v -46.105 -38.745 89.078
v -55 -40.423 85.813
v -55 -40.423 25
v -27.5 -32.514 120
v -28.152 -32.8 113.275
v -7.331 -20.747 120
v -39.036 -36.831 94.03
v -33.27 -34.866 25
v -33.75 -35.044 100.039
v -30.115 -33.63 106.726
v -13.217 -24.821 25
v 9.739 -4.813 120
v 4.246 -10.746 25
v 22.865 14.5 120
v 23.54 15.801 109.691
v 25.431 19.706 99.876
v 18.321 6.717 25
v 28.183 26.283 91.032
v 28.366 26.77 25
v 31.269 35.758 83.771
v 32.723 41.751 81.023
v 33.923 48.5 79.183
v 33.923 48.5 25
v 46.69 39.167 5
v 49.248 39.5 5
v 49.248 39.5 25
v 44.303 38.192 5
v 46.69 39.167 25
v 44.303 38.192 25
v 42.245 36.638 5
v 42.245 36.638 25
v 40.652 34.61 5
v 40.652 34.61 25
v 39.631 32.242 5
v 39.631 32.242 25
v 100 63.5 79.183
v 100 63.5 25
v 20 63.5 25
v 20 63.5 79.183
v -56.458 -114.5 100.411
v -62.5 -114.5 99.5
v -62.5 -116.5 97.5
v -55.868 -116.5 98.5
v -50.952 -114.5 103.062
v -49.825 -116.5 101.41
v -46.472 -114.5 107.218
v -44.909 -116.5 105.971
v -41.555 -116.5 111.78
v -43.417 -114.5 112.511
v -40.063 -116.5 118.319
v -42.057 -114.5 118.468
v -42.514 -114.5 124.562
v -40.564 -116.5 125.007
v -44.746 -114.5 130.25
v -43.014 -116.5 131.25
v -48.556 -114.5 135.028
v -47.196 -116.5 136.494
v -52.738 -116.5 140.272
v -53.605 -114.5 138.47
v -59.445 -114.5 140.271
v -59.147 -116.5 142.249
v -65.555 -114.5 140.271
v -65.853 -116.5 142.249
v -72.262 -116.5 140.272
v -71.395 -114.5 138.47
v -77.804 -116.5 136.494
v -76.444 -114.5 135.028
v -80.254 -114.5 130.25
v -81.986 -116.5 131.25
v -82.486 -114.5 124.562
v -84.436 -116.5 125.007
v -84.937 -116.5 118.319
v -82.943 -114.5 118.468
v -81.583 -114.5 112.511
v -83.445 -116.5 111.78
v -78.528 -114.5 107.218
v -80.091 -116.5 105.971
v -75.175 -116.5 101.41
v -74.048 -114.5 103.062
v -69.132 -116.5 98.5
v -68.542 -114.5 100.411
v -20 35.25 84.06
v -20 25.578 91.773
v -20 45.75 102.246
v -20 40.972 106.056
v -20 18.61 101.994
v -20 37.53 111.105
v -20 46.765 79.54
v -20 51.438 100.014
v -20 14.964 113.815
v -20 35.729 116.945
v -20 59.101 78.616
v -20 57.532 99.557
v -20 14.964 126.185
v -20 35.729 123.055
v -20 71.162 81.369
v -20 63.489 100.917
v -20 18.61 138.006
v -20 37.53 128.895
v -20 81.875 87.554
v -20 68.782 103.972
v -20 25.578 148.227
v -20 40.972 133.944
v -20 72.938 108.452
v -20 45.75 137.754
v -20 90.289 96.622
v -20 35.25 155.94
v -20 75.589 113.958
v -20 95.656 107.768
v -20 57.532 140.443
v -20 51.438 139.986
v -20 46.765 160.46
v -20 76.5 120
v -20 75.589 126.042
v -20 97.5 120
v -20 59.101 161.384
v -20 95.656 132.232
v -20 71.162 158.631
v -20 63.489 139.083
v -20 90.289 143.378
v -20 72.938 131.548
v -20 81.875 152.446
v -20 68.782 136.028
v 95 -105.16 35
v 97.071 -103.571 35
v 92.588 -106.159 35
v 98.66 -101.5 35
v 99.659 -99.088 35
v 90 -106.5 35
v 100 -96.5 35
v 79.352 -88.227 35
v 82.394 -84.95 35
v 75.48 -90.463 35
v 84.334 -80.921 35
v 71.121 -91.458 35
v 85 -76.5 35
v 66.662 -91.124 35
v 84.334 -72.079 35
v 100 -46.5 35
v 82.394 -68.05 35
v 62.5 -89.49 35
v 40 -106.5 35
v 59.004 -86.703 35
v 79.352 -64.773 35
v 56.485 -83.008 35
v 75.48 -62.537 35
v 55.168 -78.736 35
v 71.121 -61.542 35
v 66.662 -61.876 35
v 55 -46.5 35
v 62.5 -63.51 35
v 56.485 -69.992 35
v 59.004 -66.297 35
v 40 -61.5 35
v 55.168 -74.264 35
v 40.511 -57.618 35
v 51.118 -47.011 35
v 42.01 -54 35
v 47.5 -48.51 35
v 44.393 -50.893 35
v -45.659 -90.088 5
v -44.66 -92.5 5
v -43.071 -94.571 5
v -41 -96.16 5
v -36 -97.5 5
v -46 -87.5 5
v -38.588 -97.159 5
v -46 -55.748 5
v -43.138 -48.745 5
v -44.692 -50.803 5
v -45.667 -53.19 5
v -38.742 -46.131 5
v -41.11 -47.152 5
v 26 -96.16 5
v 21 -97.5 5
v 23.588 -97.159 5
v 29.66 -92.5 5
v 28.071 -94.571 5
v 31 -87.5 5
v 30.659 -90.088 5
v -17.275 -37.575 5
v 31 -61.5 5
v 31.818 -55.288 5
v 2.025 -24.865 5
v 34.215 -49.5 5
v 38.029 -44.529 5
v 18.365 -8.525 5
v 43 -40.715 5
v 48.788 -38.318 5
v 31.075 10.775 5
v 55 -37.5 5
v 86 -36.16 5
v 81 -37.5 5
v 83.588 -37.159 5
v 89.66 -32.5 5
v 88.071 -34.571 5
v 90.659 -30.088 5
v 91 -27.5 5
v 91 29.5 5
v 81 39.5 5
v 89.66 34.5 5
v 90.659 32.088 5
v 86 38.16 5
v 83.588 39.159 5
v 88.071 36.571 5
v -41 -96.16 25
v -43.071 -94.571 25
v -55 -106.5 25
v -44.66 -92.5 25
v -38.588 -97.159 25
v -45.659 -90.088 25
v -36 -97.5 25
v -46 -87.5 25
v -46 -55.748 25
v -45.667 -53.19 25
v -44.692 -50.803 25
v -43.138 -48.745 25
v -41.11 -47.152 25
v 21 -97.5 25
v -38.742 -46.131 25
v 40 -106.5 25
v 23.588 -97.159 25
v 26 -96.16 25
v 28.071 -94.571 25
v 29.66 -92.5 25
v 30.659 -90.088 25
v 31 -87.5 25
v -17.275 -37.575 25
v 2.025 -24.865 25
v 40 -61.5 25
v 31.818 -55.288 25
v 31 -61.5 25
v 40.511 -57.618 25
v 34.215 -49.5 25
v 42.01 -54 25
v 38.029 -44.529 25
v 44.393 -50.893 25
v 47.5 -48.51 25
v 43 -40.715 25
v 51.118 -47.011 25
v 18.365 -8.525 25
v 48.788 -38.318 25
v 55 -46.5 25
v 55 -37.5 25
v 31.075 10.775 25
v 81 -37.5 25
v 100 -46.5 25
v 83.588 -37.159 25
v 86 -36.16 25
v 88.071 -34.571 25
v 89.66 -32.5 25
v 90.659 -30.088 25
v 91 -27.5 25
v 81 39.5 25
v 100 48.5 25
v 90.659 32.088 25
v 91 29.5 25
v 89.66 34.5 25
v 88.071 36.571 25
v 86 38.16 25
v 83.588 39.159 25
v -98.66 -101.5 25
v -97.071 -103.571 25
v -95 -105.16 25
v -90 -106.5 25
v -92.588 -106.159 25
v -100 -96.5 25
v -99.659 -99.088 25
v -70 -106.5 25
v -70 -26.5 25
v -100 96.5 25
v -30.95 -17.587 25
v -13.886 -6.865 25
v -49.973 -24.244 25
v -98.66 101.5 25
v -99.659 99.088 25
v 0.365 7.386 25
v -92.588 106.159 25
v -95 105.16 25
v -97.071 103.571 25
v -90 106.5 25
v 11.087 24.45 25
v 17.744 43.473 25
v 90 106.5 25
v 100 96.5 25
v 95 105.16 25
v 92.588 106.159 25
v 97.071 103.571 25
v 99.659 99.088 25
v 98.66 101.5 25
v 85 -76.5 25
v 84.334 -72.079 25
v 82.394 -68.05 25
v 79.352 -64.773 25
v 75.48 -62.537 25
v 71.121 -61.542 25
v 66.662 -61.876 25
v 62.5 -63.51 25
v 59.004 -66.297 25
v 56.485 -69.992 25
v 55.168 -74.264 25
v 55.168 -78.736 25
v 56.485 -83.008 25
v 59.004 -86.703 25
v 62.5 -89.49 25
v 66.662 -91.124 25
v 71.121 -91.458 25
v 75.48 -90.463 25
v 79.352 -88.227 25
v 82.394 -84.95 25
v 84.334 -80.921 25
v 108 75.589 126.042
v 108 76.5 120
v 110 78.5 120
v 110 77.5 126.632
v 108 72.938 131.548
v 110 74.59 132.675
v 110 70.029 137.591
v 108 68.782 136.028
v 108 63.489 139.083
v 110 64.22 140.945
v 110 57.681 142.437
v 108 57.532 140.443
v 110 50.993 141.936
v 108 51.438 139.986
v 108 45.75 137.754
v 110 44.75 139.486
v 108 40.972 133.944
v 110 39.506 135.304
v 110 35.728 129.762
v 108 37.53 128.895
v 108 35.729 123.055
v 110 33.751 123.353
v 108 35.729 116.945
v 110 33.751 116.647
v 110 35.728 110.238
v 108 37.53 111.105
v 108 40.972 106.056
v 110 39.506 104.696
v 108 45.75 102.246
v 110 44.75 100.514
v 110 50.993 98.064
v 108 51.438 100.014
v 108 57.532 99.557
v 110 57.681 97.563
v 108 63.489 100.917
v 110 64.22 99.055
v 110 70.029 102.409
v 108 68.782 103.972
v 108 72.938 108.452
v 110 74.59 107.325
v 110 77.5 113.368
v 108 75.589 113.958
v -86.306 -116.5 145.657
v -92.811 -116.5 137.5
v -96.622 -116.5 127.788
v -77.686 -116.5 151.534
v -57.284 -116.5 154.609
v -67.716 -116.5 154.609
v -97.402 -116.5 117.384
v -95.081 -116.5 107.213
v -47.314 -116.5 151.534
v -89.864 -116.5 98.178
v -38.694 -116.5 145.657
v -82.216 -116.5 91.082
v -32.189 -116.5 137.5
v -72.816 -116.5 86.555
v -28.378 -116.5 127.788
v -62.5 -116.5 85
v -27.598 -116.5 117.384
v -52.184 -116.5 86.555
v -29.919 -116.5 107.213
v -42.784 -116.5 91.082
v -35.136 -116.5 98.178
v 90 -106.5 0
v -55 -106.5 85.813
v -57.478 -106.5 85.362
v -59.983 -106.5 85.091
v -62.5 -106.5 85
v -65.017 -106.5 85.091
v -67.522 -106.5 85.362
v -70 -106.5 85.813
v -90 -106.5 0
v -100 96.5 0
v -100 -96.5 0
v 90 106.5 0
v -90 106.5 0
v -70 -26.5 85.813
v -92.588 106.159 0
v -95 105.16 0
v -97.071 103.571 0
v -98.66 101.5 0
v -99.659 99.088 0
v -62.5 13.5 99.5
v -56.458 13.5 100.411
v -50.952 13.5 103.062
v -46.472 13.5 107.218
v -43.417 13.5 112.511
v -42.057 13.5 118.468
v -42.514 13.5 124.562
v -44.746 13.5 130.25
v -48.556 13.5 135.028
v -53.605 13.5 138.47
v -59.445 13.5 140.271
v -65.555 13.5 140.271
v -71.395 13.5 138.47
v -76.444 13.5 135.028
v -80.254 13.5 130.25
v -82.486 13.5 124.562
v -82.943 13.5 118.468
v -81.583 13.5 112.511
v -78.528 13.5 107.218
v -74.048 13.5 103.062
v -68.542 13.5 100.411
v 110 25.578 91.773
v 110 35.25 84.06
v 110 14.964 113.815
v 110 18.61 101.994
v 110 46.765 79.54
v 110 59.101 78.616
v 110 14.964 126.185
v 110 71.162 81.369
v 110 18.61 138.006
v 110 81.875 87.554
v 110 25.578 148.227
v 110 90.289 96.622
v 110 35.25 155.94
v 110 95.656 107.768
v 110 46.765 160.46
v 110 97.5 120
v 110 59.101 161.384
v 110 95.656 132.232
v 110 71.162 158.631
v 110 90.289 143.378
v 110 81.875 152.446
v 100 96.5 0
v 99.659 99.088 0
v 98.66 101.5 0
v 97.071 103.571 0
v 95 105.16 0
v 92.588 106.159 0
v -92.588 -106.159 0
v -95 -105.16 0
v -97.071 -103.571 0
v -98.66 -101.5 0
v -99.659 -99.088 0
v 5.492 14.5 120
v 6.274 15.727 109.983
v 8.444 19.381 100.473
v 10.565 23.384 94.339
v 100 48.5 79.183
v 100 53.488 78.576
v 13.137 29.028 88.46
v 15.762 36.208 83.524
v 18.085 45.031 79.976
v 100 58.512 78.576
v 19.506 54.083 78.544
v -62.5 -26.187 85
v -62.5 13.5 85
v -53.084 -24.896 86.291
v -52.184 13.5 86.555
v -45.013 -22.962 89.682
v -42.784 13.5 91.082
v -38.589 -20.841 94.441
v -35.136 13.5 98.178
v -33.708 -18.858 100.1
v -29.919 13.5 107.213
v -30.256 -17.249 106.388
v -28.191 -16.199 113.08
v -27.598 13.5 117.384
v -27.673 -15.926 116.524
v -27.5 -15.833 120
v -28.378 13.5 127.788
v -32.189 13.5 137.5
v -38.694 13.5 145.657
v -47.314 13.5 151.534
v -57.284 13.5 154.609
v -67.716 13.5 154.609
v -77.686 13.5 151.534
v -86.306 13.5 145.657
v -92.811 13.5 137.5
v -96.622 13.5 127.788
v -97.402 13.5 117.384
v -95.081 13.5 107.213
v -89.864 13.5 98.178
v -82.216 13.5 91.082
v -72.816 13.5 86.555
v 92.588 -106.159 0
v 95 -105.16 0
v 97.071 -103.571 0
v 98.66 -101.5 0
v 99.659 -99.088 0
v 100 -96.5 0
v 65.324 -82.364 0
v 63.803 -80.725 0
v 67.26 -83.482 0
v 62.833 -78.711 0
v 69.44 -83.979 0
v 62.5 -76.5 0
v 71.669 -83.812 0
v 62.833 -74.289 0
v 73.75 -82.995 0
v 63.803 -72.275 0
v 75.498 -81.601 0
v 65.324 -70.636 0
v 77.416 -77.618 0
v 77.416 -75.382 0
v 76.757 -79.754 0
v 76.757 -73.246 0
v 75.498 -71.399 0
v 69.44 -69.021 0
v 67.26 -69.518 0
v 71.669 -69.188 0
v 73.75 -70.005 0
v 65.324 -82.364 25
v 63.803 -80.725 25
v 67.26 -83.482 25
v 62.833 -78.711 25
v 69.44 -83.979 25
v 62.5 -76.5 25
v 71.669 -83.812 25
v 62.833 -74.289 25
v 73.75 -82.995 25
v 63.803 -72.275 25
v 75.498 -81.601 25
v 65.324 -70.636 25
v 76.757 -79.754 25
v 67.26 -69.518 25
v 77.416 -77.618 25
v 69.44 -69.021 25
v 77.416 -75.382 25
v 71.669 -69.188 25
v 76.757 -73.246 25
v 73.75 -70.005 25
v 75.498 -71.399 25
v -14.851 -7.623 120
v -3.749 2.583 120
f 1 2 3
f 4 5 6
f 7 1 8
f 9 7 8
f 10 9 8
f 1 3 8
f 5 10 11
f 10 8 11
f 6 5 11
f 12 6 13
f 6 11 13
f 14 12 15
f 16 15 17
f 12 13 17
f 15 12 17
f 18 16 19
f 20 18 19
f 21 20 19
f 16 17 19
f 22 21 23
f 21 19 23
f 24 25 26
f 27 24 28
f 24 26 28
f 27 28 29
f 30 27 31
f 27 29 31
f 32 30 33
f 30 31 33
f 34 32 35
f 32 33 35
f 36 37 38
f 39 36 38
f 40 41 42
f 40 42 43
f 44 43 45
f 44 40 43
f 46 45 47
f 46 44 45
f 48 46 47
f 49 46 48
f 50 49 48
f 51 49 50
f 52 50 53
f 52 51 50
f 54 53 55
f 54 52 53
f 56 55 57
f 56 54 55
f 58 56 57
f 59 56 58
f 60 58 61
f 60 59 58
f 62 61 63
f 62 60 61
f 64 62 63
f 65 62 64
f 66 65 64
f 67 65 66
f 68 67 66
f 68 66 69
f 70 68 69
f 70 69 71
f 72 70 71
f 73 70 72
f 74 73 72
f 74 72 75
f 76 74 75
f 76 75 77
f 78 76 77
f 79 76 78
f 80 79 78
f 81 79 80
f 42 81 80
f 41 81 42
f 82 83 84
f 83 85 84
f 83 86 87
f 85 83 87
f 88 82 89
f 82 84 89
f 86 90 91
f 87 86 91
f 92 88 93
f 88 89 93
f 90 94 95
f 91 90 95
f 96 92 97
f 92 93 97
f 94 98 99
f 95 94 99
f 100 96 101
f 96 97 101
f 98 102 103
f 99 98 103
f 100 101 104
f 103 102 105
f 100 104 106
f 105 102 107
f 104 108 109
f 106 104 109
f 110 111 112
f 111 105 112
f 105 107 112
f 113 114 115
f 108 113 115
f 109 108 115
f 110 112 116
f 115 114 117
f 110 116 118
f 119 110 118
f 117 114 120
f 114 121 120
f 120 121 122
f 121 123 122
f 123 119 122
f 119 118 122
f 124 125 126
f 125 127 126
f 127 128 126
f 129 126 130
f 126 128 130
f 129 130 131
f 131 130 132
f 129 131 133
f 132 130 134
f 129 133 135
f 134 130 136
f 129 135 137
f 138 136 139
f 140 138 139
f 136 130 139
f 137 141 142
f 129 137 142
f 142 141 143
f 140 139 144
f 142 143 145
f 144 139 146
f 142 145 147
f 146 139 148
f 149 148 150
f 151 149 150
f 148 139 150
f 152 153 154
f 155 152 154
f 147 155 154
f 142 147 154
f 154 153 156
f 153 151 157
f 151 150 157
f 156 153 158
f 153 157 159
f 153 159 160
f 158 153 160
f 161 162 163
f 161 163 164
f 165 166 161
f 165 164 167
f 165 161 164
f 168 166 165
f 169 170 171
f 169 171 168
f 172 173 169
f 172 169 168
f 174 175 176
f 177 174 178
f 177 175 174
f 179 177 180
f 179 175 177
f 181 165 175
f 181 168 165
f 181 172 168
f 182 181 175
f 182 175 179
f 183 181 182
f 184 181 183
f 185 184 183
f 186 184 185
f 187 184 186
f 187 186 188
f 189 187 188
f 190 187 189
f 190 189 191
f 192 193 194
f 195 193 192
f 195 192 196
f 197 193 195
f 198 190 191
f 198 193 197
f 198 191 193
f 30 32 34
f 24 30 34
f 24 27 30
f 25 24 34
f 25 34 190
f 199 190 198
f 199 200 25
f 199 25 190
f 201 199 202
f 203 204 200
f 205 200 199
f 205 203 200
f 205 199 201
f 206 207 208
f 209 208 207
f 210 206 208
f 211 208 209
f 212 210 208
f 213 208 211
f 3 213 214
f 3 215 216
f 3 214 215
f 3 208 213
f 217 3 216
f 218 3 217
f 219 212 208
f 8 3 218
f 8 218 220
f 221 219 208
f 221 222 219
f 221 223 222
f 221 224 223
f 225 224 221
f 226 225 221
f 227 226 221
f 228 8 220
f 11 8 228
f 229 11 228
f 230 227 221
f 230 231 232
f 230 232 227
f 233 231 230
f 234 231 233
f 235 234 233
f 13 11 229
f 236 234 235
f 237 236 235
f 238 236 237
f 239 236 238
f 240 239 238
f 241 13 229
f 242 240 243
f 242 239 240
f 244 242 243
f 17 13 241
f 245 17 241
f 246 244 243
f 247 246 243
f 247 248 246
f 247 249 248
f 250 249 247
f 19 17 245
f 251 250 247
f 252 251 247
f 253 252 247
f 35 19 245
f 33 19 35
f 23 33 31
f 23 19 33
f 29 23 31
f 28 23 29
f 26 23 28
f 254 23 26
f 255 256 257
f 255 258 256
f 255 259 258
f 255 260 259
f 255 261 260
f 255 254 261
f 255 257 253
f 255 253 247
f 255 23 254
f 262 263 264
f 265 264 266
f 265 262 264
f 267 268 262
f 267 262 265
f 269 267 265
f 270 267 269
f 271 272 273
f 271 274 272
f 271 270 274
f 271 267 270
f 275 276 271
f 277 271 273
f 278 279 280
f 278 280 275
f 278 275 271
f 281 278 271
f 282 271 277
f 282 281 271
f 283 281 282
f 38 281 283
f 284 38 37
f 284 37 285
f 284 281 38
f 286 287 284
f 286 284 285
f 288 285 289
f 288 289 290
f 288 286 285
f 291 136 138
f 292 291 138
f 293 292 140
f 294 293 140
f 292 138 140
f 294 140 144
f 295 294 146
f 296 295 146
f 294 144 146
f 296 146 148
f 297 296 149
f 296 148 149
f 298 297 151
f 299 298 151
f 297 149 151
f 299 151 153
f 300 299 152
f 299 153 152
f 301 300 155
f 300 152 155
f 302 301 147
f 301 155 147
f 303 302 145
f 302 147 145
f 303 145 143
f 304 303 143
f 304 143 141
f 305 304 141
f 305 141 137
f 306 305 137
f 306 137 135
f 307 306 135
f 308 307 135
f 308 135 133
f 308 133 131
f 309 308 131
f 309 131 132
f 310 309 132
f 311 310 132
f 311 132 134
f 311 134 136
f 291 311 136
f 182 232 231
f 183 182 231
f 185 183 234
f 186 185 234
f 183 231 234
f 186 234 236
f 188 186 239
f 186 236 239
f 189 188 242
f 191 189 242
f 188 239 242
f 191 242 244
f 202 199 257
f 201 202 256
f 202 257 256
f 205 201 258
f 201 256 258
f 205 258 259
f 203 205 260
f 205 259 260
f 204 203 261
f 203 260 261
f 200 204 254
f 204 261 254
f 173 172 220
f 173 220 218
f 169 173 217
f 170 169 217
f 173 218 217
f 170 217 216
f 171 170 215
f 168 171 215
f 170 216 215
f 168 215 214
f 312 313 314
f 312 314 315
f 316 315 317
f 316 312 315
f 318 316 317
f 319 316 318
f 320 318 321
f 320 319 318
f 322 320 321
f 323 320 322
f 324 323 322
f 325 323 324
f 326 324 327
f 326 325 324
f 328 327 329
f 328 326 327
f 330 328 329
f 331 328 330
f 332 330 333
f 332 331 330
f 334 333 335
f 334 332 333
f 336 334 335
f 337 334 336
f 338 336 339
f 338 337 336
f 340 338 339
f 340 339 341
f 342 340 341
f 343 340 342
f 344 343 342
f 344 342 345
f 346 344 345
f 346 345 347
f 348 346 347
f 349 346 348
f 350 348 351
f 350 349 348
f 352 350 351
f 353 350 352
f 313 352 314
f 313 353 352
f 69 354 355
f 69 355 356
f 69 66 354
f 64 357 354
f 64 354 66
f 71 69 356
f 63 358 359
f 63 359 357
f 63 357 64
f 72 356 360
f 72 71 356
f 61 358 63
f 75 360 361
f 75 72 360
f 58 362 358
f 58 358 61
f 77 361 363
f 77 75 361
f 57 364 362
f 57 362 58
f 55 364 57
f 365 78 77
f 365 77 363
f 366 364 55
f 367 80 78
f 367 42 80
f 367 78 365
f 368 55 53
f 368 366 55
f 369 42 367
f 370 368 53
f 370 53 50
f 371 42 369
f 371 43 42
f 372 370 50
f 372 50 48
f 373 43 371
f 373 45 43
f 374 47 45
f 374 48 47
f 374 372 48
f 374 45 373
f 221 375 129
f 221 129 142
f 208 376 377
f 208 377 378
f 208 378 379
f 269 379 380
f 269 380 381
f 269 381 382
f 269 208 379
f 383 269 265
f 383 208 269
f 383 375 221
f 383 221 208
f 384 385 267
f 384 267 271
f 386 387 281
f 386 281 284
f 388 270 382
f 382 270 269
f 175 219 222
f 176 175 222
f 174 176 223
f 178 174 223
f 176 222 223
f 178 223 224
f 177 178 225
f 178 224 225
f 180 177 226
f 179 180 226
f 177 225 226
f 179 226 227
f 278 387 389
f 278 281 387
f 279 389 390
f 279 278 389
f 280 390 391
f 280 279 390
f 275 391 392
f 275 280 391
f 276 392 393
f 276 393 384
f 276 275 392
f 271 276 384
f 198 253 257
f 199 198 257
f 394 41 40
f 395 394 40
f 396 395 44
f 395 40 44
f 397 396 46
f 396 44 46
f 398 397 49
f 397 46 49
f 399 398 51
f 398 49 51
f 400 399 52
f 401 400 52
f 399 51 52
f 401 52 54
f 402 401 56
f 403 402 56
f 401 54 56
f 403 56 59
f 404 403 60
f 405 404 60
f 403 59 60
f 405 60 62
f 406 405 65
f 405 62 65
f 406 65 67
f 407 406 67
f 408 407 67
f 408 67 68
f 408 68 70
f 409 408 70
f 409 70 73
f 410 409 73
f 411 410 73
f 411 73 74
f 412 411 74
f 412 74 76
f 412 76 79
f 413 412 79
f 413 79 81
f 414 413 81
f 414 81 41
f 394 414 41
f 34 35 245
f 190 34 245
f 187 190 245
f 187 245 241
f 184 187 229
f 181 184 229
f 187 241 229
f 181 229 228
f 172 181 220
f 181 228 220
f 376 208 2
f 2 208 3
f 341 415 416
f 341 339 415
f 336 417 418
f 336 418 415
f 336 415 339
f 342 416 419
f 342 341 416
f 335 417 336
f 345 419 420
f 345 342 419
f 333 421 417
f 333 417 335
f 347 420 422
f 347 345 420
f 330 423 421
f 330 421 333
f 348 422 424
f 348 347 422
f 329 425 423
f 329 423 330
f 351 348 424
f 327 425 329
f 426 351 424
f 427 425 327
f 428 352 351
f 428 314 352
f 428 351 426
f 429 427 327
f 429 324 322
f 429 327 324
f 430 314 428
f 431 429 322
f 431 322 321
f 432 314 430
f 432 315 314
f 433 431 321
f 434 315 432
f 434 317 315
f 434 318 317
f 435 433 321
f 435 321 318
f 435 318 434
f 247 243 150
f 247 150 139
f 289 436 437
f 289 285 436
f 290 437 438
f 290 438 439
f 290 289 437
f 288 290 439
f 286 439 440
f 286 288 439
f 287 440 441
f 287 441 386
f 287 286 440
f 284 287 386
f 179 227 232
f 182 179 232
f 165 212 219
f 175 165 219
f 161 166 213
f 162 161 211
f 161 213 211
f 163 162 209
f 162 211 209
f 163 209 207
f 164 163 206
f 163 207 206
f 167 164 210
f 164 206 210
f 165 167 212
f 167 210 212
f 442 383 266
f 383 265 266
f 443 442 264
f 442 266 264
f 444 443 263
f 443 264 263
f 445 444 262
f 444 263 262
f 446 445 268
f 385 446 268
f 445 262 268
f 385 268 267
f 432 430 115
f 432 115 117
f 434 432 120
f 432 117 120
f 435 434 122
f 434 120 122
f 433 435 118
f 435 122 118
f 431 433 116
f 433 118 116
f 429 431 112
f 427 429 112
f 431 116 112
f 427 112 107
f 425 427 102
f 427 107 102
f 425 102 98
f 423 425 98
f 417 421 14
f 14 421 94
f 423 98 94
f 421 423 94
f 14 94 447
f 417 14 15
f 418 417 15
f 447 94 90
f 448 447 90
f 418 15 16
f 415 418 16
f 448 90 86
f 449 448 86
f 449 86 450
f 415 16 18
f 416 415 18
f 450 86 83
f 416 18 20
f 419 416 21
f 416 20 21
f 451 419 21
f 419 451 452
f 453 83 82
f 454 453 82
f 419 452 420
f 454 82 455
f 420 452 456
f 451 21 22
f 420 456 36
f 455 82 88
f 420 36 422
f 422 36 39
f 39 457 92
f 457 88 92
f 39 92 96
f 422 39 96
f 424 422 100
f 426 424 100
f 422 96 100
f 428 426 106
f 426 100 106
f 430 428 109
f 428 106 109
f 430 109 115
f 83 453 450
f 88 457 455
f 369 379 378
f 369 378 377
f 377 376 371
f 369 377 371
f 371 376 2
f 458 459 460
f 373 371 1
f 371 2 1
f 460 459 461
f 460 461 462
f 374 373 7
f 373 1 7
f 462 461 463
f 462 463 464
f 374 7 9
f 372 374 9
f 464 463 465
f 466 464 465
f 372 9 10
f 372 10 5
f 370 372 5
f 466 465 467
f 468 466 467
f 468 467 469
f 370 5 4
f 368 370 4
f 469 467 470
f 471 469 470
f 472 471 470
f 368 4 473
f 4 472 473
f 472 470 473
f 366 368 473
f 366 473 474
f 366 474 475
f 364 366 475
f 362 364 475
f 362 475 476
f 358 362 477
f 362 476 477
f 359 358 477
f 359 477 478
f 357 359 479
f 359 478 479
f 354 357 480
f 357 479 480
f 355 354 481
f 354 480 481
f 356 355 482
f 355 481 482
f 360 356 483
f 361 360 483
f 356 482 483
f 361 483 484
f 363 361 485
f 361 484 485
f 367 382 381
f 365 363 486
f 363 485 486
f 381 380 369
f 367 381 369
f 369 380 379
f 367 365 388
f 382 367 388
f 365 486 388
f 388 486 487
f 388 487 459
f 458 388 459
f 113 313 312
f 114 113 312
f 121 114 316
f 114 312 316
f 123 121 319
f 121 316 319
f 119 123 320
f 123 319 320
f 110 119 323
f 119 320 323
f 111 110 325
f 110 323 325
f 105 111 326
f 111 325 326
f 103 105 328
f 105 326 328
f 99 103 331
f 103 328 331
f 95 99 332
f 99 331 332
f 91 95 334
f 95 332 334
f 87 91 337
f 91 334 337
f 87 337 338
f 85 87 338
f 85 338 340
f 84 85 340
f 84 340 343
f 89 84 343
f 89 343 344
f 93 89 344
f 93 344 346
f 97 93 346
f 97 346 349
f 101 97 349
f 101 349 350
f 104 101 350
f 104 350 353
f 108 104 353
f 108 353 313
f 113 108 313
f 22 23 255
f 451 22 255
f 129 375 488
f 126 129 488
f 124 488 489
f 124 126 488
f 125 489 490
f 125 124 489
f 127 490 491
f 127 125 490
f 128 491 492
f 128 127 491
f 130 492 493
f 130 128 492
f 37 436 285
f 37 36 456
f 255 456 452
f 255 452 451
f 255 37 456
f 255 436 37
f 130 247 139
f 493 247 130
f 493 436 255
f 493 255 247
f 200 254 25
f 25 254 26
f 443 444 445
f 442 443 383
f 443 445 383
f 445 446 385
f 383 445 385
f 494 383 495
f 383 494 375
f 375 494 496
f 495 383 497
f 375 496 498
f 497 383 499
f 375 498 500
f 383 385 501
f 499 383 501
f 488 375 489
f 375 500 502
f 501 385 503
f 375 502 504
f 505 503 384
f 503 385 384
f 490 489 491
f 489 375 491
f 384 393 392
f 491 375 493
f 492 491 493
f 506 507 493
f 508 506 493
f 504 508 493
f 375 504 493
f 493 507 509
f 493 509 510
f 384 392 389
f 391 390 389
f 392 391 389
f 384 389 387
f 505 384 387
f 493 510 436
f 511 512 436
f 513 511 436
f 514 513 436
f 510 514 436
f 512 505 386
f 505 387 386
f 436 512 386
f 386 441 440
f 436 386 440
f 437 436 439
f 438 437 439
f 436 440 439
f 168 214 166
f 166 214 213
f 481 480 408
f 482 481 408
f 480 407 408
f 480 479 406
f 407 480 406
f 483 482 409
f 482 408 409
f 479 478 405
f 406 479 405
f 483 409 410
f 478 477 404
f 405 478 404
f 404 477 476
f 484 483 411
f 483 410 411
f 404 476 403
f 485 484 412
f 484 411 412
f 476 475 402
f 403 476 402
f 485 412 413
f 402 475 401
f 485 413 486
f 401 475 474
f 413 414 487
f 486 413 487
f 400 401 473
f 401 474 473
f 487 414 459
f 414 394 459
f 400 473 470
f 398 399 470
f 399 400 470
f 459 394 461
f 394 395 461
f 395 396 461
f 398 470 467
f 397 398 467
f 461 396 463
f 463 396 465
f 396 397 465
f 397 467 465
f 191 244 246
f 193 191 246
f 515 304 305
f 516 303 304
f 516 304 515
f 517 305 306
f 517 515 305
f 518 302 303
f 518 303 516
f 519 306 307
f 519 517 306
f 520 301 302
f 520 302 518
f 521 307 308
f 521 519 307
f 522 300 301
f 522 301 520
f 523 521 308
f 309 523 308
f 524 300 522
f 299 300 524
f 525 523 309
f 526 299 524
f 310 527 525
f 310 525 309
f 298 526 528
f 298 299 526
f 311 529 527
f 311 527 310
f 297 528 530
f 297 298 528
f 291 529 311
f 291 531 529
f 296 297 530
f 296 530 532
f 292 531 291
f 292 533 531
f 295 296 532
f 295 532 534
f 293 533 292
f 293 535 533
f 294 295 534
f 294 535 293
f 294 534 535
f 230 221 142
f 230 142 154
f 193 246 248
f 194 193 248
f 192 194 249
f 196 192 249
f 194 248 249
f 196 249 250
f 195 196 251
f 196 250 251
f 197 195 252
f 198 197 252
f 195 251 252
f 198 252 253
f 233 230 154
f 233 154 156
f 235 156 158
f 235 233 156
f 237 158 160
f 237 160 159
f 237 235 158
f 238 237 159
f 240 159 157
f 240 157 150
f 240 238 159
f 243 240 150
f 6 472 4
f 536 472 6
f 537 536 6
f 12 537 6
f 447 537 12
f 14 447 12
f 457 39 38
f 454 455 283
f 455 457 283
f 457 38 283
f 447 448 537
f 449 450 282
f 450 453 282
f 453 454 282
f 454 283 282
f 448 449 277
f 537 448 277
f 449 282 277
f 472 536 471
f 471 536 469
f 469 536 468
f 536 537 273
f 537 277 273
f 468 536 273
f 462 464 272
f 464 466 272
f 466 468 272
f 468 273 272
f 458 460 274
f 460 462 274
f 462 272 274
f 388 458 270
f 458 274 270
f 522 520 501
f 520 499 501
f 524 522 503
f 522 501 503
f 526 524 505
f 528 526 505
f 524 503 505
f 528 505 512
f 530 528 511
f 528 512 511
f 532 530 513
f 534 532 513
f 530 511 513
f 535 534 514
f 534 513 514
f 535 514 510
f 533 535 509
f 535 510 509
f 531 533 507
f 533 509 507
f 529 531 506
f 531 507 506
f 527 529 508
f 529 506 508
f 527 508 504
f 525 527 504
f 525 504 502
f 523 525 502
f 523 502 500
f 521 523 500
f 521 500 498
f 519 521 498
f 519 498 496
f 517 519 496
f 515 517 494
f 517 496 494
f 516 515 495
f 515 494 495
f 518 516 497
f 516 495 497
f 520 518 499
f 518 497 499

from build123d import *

# Parameters (mm, degrees)
SKETCH1_W                               = 200
SKETCH1_H                               = 213
BOSS_EXTRUDE1_DEPTH                     = 25
BOSS_EXTRUDE2_DEPTH                     = 10
FILLET1_R                               = 10
EXTRUDE_THIN1_DEPTH                     = 95
BOSS_EXTRUDE3_DEPTH                     = 10
BOSS_EXTRUDE3_DEPTH_BACK                = 120
SKETCH5_R                               = 35
BOSS_EXTRUDE4_DEPTH                     = 10
BOSS_EXTRUDE4_DEPTH_BACK                = 120
SKETCH6_R                               = 41.5
CUT_EXTRUDE1_REACH                      = 298.498
SKETCH7_R                               = 20.5
CUT_EXTRUDE2_REACH                      = 291.404
SKETCH8_R                               = 20.5
CHAMFER1_SIZE                           = 2
CUT_EXTRUDE3_DEPTH                      = 20
CBORE_FOR_M8_HEX_HEAD_BOLT1_D           = 15
CBORE_FOR_M8_HEX_HEAD_BOLT1_CBORE_D     = 30
CBORE_FOR_M8_HEX_HEAD_BOLT1_CBORE_DEPTH = 10


with BuildPart() as part:
    # Sketch1 → Boss-Extrude1 (new body)
    with BuildSketch(Plane.XY):
        Rectangle(SKETCH1_W, SKETCH1_H)
    extrude(amount=BOSS_EXTRUDE1_DEPTH)

    # Sketch3 → Boss-Extrude2 (add)
    with BuildSketch(Plane.XY.offset(25)):
        with BuildLine():
            Line((100, -106.5), (40, -106.5))
            Line((40, -106.5), (40, -61.5))
            ThreePointArc((40, -61.5), (44.393398282, -50.893398282), (55, -46.5))
            Line((55, -46.5), (100, -46.5))
            Line((100, -46.5), (100, -106.5))
        make_face()
    extrude(amount=BOSS_EXTRUDE2_DEPTH)

    # Fillet1
    fillet1_edges = [part.edges().sort_by_distance(p)[0] for p in [
        (100, -106.5, 17.5),
        (-100, -106.5, 12.5),
        (-100, 106.5, 12.5),
        (100, 106.5, 12.5),
    ]]
    fillet(fillet1_edges, radius=FILLET1_R)

    # Sketch4 → Extrude-Thin1 (add)
    with BuildSketch(Plane.XY.offset(25)):
        with BuildLine():
            Line((100, 63.5), (20, 63.5))
            ThreePointArc((20, 63.5), (-6.360389693, -0.139610307), (-70, -26.5))
            Line((-70, -26.5), (-70, -106.5))
            Line((-70, -106.5), (-60, -106.5))
            Line((-60, -106.5), (-60, -35.998743711))
            ThreePointArc((-60, -35.998743711), (0.710678119, -7.210678119), (29.498743711, 53.5))
            Line((29.498743711, 53.5), (100, 53.5))
            Line((100, 53.5), (100, 63.5))
        make_face()
        with BuildLine():
            Line((-55, -106.5), (-55, -40.423048454))
            ThreePointArc((-55, -40.423048454), (4.246212025, -10.746212025), (33.923048454, 48.5))
            Line((33.923048454, 48.5), (100, 48.5))
            Line((100, 48.5), (100, 58.5))
            Line((100, 58.5), (24.868329805, 58.5))
            ThreePointArc((24.868329805, 58.5), (-2.824855787, -3.675144213), (-65, -31.368329805))
            Line((-65, -31.368329805), (-65, -106.5))
            Line((-65, -106.5), (-55, -106.5))
        make_face()
    extrude(amount=EXTRUDE_THIN1_DEPTH)

    # Sketch5 → Boss-Extrude3 (add, two sides: drawn at the far end of the back side and taken through both)
    with BuildSketch(Plane.XZ.offset(106.5).offset(-BOSS_EXTRUDE3_DEPTH_BACK)):
        with Locations(Location((-62.5, 120, 0), (0, 0, 270))):
            Circle(SKETCH5_R)
    extrude(amount=BOSS_EXTRUDE3_DEPTH + BOSS_EXTRUDE3_DEPTH_BACK)

    # Sketch6 → Boss-Extrude4 (add, two sides: drawn at the far end of the back side and taken through both)
    with BuildSketch(Plane(origin=(100, 0, 0), x_dir=(0, 0, -1), z_dir=(1, 0, 0)).offset(-BOSS_EXTRUDE4_DEPTH_BACK)):
        with Locations(Location((-120, 56, 0), (0, 0, 90))):
            Circle(SKETCH6_R)
    extrude(amount=BOSS_EXTRUDE4_DEPTH + BOSS_EXTRUDE4_DEPTH_BACK)

    # Sketch7 → Cut-Extrude1 (cut, up to next)
    with BuildSketch(Plane.XZ.offset(116.5), mode=Mode.PRIVATE) as cut_extrude1_sk1:
        with Locations(Location((-62.5, 120, 0), (0, 0, 270))):
            Circle(SKETCH7_R)
    cut_extrude1_tool1 = extrude(cut_extrude1_sk1.sketch, amount=-CUT_EXTRUDE1_REACH, mode=Mode.PRIVATE) & part.part
    add(cut_extrude1_tool1.solids().sort_by_distance((-62.5, -116.5, 120))[0], mode=Mode.SUBTRACT)

    # Sketch8 → Cut-Extrude2 (cut, up to next)
    with BuildSketch(Plane(origin=(110, 0, 0), x_dir=(0, 0, -1), z_dir=(1, 0, 0)), mode=Mode.PRIVATE) as cut_extrude2_sk1:
        with Locations(Location((-120, 56, 0), (0, 0, 90))):
            Circle(SKETCH8_R)
    cut_extrude2_tool1 = extrude(cut_extrude2_sk1.sketch, amount=-CUT_EXTRUDE2_REACH, mode=Mode.PRIVATE) & part.part
    add(cut_extrude2_tool1.solids().sort_by_distance((110, 56, 120))[0], mode=Mode.SUBTRACT)

    # Chamfer1
    chamfer1_edges = [part.edges().sort_by_distance(p)[0] for p in [
        (-62.5, -116.5, 140.5),
        (110, 35.5, 120),
    ]]
    chamfer(chamfer1_edges, length=CHAMFER1_SIZE)

    # Sketch9 → Cut-Extrude3 (cut)
    with BuildSketch(Plane.XY.offset(25)):
        with BuildLine():
            Line((-46, -55.747641486), (-46, -87.5))
            ThreePointArc((-46, -87.5), (-43.071067812, -94.571067812), (-36, -97.5))
            Line((-36, -97.5), (21, -97.5))
            ThreePointArc((21, -97.5), (28.071067812, -94.571067812), (31, -87.5))
            Line((31, -87.5), (31, -61.5))
            ThreePointArc((31, -61.5), (38.029437252, -44.529437252), (55, -37.5))
            Line((55, -37.5), (81, -37.5))
            ThreePointArc((81, -37.5), (88.071067812, -34.571067812), (91, -27.5))
            Line((91, -27.5), (91, 29.5))
            ThreePointArc((91, 29.5), (88.071067812, 36.571067812), (81, 39.5))
            Line((81, 39.5), (49.247641486, 39.5))
            ThreePointArc((49.247641486, 39.5), (43.223496519, 37.481834214), (39.630896205, 32.241935484))
            ThreePointArc((39.630896205, 32.241935484), (10.610173055, -17.110173055), (-38.741935484, -46.130896205))
            ThreePointArc((-38.741935484, -46.130896205), (-43.981834214, -49.723496519), (-46, -55.747641486))
        make_face()
    extrude(amount=-CUT_EXTRUDE3_DEPTH, mode=Mode.SUBTRACT)

    # CBORE for M8 Hex Head Bolt1 (through all)
    with Locations(Plane.XY.offset(35)):
        with Locations((70, -76.5)):
            CounterBoreHole(CBORE_FOR_M8_HEX_HEAD_BOLT1_D / 2, CBORE_FOR_M8_HEX_HEAD_BOLT1_CBORE_D / 2, CBORE_FOR_M8_HEX_HEAD_BOLT1_CBORE_DEPTH)


solid = part.part
